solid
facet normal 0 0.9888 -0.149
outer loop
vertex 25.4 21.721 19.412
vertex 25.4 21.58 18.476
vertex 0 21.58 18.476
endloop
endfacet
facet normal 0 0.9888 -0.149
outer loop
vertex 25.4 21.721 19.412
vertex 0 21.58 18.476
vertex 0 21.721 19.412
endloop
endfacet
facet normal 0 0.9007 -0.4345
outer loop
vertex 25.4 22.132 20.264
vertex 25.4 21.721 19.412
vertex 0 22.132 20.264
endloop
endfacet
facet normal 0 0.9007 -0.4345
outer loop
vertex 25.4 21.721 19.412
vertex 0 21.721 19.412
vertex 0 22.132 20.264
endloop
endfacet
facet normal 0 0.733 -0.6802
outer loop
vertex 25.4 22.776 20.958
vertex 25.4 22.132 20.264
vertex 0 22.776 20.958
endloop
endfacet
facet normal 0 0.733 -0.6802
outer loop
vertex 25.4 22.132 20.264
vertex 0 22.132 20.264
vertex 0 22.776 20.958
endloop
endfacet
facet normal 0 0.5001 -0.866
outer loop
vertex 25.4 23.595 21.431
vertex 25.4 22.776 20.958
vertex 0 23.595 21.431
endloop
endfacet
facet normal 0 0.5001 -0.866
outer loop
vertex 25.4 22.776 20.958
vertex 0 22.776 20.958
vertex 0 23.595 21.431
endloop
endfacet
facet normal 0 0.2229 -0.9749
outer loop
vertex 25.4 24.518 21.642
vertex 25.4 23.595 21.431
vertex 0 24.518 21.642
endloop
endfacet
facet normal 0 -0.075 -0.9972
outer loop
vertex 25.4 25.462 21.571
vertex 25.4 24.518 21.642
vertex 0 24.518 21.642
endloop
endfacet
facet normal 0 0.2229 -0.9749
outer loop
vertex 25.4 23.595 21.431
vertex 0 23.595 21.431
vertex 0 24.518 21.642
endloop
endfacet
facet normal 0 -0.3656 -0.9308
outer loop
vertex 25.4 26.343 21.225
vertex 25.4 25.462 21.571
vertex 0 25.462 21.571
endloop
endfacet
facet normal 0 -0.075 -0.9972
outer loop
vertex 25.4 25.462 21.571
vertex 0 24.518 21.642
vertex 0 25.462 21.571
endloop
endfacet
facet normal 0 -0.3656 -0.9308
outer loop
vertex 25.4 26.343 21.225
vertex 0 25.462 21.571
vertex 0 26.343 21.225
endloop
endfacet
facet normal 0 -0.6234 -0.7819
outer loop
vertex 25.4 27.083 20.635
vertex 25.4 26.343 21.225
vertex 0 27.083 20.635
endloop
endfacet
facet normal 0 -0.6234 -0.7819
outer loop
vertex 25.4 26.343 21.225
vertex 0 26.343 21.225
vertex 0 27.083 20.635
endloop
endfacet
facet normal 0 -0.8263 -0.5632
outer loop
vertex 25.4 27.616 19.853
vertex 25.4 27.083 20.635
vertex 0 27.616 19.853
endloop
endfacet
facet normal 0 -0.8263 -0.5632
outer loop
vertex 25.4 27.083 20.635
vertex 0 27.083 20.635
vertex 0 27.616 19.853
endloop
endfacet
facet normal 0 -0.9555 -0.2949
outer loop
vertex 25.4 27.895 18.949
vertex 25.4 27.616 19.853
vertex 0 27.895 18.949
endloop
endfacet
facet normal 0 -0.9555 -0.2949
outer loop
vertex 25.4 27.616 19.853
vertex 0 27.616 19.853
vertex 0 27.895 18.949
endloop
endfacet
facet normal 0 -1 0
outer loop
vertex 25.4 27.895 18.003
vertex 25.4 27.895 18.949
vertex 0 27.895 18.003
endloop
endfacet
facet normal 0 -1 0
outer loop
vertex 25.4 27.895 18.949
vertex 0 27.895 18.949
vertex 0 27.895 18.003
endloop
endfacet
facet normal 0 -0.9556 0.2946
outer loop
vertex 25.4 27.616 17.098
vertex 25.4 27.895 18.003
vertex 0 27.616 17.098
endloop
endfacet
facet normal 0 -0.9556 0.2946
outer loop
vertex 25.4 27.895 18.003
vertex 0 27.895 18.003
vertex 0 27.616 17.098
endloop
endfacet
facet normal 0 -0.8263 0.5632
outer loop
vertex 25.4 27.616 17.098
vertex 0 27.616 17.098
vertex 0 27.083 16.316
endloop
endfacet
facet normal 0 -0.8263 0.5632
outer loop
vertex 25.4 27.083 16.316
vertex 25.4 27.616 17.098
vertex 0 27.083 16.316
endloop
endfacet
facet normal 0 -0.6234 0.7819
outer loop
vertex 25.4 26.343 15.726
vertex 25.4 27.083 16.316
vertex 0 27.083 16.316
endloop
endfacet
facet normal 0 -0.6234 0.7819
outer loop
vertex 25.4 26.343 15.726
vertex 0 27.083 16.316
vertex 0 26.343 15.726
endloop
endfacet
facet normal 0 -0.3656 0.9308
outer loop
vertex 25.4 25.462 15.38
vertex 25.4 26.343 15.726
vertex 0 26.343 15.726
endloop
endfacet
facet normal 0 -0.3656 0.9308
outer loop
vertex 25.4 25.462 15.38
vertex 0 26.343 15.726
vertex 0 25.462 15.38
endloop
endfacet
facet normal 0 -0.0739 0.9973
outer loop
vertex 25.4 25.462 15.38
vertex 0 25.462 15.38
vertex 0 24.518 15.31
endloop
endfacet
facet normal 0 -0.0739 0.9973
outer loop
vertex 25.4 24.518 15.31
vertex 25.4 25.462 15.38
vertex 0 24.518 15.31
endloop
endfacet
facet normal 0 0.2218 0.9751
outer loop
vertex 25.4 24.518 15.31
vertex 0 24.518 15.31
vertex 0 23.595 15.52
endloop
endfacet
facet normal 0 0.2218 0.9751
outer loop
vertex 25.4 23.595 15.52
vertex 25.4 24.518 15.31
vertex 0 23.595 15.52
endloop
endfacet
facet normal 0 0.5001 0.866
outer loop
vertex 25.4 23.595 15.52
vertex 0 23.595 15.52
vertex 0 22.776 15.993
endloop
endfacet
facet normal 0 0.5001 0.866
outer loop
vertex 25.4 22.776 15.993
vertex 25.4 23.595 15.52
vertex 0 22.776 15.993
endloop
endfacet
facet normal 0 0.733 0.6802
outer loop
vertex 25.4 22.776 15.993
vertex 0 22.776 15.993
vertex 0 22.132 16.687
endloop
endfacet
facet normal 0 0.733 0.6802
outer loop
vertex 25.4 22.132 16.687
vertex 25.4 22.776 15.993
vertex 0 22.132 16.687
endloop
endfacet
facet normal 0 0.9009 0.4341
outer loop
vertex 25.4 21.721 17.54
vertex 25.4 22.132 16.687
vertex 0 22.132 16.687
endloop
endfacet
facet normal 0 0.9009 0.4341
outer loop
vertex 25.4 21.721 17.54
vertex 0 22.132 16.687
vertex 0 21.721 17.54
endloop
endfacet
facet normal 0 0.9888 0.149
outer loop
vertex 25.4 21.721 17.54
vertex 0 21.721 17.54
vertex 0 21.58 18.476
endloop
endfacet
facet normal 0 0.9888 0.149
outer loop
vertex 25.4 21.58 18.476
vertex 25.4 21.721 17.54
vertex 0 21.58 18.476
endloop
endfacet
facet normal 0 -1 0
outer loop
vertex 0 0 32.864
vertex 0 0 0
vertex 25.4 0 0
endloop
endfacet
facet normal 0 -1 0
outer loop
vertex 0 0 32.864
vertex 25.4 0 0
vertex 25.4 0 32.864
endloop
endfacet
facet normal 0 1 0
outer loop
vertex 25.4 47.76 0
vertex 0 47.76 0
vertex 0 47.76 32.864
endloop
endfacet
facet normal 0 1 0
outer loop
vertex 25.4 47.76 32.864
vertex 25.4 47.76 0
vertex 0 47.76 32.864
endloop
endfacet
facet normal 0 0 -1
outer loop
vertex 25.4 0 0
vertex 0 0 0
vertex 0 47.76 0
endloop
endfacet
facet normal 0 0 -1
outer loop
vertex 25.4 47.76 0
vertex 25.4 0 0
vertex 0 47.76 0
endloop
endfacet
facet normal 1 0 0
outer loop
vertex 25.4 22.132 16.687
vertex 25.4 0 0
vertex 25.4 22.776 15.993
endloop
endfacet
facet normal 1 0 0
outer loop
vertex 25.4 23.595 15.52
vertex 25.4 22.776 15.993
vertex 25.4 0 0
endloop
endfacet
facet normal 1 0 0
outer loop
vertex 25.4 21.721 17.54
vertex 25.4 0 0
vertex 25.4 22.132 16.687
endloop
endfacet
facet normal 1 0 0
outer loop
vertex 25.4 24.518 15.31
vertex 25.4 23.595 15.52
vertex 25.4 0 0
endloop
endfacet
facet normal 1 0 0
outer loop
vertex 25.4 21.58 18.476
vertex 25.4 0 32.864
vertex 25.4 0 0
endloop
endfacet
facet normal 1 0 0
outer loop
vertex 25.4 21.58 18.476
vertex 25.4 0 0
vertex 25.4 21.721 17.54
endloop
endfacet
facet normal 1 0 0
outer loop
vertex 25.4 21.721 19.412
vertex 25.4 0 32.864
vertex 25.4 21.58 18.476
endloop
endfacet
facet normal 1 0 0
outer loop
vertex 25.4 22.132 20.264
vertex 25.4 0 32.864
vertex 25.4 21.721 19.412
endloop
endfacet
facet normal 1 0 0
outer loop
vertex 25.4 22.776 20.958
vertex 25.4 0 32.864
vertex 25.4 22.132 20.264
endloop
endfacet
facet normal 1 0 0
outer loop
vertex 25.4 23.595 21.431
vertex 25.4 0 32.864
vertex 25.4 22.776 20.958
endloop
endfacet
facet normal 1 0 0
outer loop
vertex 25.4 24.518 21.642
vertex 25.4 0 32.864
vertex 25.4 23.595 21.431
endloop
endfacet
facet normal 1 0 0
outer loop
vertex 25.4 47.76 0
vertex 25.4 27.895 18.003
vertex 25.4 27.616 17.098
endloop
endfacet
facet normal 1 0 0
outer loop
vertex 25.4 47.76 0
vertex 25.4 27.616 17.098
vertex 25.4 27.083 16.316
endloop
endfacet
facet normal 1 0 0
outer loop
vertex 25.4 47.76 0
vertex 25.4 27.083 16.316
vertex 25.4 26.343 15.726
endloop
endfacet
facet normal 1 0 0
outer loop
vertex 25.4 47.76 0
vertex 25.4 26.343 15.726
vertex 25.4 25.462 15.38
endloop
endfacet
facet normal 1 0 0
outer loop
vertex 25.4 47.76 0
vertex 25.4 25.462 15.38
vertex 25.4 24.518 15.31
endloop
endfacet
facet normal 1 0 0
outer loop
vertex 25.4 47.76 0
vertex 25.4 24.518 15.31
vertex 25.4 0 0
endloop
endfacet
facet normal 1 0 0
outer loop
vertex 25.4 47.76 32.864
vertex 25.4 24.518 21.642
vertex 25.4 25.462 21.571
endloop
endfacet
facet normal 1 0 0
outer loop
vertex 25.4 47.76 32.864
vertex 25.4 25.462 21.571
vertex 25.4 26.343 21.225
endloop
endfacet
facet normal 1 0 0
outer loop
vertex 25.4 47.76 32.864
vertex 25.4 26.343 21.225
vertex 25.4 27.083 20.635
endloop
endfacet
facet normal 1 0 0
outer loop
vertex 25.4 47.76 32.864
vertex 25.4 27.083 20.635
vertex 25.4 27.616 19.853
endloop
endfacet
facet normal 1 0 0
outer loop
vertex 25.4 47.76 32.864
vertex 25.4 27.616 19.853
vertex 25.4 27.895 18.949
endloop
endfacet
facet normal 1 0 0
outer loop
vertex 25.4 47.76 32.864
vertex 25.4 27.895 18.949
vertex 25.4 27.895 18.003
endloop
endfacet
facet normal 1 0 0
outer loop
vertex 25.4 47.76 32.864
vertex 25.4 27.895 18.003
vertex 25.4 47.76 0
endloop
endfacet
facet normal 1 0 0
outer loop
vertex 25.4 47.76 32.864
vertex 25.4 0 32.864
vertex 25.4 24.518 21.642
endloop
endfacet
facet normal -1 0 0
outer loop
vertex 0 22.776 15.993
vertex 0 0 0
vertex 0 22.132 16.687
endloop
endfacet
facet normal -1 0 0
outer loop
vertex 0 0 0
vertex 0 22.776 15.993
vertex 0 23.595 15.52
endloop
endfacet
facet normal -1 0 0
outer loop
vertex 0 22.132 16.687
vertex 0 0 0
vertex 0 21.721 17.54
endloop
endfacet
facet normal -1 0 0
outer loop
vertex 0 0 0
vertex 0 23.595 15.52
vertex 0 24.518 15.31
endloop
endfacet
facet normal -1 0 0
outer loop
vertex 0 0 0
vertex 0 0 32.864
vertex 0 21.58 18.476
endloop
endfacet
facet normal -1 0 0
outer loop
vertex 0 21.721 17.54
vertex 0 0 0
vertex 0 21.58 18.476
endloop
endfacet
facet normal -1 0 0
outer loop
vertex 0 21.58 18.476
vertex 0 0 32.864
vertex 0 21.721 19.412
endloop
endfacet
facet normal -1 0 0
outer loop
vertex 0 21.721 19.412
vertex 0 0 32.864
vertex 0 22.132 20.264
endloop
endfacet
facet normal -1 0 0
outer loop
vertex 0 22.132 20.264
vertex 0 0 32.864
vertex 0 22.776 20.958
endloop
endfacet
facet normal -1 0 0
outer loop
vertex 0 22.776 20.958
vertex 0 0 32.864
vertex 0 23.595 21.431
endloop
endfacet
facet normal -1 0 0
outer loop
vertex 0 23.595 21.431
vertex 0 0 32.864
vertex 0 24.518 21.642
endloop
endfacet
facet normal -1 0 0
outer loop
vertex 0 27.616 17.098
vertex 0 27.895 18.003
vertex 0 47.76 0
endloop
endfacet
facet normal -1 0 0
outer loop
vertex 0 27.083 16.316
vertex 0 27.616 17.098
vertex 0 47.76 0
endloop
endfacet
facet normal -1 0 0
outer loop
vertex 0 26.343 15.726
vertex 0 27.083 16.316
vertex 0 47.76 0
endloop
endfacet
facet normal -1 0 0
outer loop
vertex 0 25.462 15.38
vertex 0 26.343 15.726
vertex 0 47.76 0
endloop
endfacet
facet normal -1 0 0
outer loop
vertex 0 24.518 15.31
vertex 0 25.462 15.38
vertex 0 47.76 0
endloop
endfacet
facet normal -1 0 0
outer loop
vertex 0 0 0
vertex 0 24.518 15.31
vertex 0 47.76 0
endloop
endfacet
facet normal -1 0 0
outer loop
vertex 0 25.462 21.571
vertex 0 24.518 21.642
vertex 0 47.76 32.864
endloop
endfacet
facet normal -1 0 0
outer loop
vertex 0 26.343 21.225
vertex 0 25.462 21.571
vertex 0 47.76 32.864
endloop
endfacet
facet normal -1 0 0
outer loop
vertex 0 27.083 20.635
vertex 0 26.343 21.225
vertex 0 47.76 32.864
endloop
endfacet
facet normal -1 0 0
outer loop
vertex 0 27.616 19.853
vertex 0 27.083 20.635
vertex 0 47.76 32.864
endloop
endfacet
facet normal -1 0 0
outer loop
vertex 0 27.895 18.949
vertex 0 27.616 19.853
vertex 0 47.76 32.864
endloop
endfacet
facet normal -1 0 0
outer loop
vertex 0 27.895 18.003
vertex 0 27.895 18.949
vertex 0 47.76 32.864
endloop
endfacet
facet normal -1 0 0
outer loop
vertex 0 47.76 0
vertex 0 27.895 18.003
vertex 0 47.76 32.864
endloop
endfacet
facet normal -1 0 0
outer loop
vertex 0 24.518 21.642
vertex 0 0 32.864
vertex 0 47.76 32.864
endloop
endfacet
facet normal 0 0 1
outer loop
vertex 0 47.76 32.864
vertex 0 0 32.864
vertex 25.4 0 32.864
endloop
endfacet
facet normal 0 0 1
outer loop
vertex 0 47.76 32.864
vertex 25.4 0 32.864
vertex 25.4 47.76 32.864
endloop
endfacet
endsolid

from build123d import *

# Parameters (mm, degrees)
F0_W     = 47.759749
F0_H     = 32.863535
F1_DEPTH = 25.4
F3_D     = 6.35


with BuildPart() as f1:
    # F0 (on Right) → F1 (new body)
    with BuildSketch(Plane.YZ):
        with Locations((23.879874, 16.431767)):
            Rectangle(F0_W, F0_H)
    extrude(amount=F1_DEPTH)

    # F3 (through all)
    with Locations(Plane.YZ.offset(25.4)):
        with Locations((24.755191, 18.47573)):
            Hole(F3_D / 2)


solid = f1.part
